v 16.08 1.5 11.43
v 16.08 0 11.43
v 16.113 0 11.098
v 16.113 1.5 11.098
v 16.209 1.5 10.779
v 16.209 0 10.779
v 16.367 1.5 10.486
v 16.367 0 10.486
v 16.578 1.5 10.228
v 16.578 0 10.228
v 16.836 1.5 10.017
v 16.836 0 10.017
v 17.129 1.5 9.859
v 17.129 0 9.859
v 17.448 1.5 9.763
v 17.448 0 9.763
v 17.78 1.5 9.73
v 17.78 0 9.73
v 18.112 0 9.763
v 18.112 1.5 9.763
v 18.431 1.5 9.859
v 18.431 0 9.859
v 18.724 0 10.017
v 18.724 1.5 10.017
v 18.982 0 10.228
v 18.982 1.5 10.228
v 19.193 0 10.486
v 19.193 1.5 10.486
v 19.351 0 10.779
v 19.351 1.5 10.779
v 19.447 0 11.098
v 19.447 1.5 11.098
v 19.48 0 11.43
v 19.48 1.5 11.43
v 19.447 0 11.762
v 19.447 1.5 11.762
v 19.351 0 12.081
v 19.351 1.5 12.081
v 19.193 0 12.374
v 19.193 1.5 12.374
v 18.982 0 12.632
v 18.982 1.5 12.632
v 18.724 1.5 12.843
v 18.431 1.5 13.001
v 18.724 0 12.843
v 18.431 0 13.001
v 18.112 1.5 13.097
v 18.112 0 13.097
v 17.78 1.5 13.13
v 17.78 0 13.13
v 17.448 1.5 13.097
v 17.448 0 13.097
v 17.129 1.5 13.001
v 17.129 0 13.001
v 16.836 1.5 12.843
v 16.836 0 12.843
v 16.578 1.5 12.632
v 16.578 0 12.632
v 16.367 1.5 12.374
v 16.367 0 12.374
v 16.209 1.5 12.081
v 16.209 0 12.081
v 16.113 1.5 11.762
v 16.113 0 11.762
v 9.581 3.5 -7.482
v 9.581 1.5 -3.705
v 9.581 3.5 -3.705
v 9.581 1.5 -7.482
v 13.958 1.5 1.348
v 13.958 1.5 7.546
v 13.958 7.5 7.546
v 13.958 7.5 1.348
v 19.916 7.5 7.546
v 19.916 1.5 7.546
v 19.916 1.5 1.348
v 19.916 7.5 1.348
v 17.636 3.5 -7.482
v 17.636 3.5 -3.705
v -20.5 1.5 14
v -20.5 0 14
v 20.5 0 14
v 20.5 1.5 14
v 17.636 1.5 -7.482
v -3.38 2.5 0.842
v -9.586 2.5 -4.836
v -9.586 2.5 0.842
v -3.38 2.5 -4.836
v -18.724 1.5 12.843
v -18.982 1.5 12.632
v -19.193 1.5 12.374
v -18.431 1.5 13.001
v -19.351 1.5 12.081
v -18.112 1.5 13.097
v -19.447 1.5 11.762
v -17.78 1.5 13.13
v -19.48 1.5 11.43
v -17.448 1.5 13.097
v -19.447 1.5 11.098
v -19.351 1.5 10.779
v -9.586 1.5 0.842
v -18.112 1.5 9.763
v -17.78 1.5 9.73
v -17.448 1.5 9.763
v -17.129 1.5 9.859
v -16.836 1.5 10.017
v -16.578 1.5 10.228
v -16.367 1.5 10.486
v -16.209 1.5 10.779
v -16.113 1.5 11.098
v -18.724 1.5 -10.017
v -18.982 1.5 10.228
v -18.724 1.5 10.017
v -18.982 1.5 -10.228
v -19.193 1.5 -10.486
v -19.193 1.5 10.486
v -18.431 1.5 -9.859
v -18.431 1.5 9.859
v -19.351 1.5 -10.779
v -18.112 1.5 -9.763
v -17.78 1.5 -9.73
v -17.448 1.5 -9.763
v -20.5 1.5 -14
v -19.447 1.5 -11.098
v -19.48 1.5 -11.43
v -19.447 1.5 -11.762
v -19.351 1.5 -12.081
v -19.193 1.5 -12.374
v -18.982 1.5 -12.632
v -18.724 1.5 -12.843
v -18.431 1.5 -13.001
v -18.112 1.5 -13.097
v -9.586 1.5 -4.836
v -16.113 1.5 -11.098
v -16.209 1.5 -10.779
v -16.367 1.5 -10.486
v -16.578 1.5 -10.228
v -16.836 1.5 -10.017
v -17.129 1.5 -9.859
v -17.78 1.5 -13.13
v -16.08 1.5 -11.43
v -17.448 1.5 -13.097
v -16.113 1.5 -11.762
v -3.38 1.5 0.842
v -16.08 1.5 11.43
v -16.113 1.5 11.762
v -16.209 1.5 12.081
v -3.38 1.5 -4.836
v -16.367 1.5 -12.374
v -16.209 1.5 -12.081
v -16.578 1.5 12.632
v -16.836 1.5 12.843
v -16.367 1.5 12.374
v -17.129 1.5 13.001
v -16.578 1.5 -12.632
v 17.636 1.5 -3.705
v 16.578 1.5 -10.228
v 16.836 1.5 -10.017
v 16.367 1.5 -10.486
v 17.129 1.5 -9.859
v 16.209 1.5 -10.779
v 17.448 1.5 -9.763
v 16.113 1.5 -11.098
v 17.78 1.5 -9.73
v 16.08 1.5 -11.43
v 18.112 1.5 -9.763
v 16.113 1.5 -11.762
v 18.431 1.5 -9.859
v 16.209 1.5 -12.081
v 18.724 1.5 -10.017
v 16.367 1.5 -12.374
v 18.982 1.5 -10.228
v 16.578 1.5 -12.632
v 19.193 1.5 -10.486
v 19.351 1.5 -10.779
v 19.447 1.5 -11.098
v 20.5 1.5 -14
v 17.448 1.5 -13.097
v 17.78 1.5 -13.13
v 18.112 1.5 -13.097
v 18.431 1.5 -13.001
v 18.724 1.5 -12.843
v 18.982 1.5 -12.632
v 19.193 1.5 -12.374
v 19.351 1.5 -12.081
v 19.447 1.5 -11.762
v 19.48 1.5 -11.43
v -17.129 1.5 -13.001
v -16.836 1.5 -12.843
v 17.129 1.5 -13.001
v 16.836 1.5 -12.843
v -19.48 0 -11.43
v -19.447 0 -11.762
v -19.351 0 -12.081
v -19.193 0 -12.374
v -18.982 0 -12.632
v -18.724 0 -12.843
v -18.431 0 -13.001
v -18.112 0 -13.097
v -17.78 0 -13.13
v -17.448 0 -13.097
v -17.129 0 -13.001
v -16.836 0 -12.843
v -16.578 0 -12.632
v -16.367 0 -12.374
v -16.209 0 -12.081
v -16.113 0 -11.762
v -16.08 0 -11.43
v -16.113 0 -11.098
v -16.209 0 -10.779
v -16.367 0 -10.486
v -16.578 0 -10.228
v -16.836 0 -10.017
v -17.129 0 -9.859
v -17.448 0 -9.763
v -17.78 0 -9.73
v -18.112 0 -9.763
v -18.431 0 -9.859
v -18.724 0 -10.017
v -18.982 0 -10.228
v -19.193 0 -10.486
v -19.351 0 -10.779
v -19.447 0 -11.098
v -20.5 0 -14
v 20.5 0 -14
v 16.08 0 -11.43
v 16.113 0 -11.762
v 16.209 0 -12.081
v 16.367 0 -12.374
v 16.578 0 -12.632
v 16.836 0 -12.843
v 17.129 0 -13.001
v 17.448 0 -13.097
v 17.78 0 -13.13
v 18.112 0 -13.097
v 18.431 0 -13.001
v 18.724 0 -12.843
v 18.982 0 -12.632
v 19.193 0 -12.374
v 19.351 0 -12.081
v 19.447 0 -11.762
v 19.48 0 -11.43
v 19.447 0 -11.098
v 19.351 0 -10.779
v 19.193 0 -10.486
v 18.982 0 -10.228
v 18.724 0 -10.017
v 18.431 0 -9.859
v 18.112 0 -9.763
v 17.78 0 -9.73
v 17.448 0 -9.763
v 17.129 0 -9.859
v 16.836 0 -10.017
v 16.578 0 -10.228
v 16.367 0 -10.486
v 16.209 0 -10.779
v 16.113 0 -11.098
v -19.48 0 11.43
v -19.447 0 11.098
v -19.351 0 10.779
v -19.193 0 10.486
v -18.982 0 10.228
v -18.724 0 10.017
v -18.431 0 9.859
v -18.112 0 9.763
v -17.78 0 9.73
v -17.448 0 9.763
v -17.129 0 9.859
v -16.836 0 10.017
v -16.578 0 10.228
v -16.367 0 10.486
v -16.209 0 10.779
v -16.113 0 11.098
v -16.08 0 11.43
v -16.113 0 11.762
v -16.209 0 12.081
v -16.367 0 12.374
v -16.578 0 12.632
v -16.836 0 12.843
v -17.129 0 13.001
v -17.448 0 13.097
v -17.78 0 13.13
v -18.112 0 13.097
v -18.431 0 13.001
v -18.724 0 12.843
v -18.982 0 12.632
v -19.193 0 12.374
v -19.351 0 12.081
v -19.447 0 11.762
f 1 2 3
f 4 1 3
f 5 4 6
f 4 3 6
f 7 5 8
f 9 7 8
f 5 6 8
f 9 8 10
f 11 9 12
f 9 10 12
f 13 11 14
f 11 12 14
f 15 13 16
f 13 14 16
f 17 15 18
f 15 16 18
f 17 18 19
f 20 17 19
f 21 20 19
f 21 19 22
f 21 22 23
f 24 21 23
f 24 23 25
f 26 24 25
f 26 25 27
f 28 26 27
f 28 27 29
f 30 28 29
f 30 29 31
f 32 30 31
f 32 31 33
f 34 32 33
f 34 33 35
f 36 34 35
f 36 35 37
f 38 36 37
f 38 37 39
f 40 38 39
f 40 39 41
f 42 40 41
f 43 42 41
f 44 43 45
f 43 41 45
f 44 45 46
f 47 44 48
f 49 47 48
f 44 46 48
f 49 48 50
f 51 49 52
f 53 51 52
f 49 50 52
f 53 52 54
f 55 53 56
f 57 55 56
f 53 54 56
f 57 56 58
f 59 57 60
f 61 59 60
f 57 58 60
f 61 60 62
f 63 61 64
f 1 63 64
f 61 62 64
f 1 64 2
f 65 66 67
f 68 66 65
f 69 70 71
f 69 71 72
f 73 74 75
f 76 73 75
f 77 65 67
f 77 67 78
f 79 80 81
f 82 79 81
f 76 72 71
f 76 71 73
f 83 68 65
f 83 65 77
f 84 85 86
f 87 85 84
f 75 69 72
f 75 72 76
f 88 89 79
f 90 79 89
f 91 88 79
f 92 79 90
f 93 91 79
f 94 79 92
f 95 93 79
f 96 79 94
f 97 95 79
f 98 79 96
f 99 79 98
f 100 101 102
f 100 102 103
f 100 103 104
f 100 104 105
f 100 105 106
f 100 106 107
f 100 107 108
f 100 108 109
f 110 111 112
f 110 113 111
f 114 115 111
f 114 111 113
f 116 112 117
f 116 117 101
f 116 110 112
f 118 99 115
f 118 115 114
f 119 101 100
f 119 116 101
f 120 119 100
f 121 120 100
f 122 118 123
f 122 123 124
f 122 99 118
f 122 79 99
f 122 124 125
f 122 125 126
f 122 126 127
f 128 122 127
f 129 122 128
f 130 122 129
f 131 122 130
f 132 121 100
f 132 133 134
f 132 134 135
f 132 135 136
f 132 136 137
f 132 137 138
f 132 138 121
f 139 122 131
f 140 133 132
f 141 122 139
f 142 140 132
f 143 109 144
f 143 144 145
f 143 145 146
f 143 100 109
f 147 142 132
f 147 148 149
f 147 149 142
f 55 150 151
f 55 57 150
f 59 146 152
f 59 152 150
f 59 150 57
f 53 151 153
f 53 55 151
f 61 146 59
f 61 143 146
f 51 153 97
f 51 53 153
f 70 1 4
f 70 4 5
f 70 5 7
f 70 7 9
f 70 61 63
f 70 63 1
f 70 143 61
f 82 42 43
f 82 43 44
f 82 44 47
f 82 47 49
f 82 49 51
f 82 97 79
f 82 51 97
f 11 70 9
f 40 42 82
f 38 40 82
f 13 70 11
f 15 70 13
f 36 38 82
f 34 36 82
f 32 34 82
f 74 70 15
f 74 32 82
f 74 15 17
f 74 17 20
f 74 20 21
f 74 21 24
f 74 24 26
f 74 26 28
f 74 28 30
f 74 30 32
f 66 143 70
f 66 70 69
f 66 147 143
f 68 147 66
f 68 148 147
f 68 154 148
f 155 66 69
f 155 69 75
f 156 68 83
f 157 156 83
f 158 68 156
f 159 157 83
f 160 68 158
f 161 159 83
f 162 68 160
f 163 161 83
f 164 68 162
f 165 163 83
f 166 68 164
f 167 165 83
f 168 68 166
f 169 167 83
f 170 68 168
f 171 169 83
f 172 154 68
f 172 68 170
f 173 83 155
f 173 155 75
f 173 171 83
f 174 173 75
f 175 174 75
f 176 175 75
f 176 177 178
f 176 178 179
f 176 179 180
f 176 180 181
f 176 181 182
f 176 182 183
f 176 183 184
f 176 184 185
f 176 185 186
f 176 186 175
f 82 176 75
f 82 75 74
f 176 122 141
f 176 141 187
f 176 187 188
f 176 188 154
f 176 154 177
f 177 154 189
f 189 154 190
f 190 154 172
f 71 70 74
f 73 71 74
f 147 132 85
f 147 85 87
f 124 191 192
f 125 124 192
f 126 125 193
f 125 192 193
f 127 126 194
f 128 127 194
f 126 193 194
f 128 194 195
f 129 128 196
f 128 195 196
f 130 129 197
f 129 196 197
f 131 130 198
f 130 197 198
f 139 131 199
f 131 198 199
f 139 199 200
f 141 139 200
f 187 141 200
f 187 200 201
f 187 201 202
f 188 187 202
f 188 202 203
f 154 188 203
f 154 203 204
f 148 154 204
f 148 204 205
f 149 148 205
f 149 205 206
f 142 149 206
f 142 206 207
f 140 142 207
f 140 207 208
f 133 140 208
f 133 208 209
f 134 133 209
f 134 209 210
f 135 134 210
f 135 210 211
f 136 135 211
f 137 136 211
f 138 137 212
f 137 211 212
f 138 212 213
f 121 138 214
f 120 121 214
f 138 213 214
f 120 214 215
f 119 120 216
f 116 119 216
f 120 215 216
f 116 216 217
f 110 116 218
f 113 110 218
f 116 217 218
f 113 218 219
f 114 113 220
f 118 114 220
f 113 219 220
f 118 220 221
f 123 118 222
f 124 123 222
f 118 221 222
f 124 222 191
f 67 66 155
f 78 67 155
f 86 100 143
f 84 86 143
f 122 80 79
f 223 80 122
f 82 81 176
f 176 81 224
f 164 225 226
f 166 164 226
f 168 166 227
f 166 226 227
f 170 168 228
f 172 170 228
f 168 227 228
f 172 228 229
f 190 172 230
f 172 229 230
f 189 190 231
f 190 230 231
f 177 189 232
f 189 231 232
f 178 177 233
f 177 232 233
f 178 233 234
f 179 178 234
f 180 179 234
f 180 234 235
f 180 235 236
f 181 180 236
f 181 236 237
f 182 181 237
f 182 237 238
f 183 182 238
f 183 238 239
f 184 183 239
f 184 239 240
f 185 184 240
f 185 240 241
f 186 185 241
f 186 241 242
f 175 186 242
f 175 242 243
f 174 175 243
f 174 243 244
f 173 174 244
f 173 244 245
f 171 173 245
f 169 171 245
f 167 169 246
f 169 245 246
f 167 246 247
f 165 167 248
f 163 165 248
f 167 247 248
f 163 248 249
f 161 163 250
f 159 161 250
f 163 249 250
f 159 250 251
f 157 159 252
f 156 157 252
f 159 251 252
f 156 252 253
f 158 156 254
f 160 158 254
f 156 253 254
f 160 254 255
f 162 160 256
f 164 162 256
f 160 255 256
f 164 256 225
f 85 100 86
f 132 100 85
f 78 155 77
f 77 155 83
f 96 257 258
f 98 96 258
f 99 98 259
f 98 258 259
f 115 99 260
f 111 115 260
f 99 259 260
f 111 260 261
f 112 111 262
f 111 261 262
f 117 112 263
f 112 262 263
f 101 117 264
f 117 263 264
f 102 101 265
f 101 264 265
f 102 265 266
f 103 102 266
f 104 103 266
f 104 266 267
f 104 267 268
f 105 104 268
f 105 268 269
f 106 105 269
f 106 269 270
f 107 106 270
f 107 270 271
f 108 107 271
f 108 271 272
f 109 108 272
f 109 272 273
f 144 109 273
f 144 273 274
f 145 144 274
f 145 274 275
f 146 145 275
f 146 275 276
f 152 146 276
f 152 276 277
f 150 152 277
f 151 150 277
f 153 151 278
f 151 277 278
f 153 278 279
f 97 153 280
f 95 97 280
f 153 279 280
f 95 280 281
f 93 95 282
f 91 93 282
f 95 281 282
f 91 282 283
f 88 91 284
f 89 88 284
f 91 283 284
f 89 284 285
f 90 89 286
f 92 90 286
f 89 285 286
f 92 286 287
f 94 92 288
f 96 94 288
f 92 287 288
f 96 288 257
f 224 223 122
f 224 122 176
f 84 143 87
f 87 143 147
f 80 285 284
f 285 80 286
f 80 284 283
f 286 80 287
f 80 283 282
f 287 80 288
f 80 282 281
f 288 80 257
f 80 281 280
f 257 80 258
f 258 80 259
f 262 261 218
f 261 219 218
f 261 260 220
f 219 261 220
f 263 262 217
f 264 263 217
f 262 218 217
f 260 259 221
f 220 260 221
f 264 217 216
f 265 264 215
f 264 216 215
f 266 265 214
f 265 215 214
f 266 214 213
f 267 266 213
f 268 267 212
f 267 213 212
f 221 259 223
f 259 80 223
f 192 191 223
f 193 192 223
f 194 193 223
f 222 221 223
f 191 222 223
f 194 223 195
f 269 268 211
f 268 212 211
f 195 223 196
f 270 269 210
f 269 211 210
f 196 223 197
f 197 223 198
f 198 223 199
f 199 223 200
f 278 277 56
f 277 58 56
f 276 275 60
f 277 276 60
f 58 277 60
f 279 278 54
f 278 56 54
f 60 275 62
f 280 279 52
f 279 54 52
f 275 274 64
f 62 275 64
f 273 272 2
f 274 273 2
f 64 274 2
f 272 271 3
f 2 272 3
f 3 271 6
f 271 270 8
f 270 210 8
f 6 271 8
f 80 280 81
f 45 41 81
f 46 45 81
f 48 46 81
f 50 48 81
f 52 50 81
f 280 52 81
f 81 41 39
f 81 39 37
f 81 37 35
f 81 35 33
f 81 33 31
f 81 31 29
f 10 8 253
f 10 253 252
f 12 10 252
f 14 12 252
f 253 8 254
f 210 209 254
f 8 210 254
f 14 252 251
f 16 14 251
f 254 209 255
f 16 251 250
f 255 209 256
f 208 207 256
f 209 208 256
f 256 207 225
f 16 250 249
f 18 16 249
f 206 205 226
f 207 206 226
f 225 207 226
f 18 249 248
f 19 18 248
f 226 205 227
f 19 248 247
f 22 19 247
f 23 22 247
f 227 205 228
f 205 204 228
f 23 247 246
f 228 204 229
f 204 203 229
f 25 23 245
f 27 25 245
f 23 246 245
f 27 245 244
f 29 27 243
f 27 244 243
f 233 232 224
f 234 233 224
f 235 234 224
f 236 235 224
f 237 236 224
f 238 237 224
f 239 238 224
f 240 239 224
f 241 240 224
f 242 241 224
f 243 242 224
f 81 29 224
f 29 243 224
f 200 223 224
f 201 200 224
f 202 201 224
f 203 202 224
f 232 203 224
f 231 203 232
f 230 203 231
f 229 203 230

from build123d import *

# Parameters (mm, degrees)
SCHIZZO1_W                   = 41
SCHIZZO1_H                   = 28
ESTRUSIONE_ESTRUSIONE1_DEPTH = 1.5
FORO_PER_VITE_M3_1_D         = 3.4
SCHIZZO5_W                   = 6.206252214
SCHIZZO5_H                   = 5.678489494
ESTRUSIONE_ESTRUSIONE2_DEPTH = 1
SCHIZZO6_W                   = 5.958246431
SCHIZZO6_H                   = 6.198352004
ESTRUSIONE_ESTRUSIONE3_DEPTH = 6
SCHIZZO7_W                   = 8.055062412
SCHIZZO7_H                   = 3.777135449
ESTRUSIONE_ESTRUSIONE4_DEPTH = 2


with BuildPart() as part:
    # Schizzo1 → Estrusione-Estrusione1 (new body)
    with BuildSketch(Plane(origin=(0, 0, 0), x_dir=(1, 0, 0), z_dir=(0, 1, 0))):
        Rectangle(SCHIZZO1_W, SCHIZZO1_H)
    extrude(amount=ESTRUSIONE_ESTRUSIONE1_DEPTH)

    # Foro per Vite M3-1 (through all)
    with Locations(Plane(origin=(0, 1.5, 0), x_dir=(1, 0, 0), z_dir=(0, 1, 0))):
        with Locations((17.78, -11.43), (17.78, 11.43), (-17.78, 11.43), (-17.78, -11.43)):
            Hole(FORO_PER_VITE_M3_1_D / 2)

    # Schizzo5 → Estrusione-Estrusione2 (add)
    with BuildSketch(Plane(origin=(0, 1.5, 0), x_dir=(1, 0, 0), z_dir=(0, 1, 0))):
        with Locations((-6.482937483, 1.99695437)):
            Rectangle(SCHIZZO5_W, SCHIZZO5_H)
    extrude(amount=ESTRUSIONE_ESTRUSIONE2_DEPTH)

    # Schizzo6 → Estrusione-Estrusione3 (add)
    with BuildSketch(Plane(origin=(0, 1.5, 0), x_dir=(1, 0, 0), z_dir=(0, 1, 0))):
        with Locations((16.937357628, -4.446973273)):
            Rectangle(SCHIZZO6_W, SCHIZZO6_H)
    extrude(amount=ESTRUSIONE_ESTRUSIONE3_DEPTH)

    # Schizzo7 → Estrusione-Estrusione4 (add)
    with BuildSketch(Plane(origin=(0, 1.5, 0), x_dir=(1, 0, 0), z_dir=(0, 1, 0))):
        with Locations((13.608521834, 5.593352434)):
            Rectangle(SCHIZZO7_W, SCHIZZO7_H)
    extrude(amount=ESTRUSIONE_ESTRUSIONE4_DEPTH)


solid = part.part
